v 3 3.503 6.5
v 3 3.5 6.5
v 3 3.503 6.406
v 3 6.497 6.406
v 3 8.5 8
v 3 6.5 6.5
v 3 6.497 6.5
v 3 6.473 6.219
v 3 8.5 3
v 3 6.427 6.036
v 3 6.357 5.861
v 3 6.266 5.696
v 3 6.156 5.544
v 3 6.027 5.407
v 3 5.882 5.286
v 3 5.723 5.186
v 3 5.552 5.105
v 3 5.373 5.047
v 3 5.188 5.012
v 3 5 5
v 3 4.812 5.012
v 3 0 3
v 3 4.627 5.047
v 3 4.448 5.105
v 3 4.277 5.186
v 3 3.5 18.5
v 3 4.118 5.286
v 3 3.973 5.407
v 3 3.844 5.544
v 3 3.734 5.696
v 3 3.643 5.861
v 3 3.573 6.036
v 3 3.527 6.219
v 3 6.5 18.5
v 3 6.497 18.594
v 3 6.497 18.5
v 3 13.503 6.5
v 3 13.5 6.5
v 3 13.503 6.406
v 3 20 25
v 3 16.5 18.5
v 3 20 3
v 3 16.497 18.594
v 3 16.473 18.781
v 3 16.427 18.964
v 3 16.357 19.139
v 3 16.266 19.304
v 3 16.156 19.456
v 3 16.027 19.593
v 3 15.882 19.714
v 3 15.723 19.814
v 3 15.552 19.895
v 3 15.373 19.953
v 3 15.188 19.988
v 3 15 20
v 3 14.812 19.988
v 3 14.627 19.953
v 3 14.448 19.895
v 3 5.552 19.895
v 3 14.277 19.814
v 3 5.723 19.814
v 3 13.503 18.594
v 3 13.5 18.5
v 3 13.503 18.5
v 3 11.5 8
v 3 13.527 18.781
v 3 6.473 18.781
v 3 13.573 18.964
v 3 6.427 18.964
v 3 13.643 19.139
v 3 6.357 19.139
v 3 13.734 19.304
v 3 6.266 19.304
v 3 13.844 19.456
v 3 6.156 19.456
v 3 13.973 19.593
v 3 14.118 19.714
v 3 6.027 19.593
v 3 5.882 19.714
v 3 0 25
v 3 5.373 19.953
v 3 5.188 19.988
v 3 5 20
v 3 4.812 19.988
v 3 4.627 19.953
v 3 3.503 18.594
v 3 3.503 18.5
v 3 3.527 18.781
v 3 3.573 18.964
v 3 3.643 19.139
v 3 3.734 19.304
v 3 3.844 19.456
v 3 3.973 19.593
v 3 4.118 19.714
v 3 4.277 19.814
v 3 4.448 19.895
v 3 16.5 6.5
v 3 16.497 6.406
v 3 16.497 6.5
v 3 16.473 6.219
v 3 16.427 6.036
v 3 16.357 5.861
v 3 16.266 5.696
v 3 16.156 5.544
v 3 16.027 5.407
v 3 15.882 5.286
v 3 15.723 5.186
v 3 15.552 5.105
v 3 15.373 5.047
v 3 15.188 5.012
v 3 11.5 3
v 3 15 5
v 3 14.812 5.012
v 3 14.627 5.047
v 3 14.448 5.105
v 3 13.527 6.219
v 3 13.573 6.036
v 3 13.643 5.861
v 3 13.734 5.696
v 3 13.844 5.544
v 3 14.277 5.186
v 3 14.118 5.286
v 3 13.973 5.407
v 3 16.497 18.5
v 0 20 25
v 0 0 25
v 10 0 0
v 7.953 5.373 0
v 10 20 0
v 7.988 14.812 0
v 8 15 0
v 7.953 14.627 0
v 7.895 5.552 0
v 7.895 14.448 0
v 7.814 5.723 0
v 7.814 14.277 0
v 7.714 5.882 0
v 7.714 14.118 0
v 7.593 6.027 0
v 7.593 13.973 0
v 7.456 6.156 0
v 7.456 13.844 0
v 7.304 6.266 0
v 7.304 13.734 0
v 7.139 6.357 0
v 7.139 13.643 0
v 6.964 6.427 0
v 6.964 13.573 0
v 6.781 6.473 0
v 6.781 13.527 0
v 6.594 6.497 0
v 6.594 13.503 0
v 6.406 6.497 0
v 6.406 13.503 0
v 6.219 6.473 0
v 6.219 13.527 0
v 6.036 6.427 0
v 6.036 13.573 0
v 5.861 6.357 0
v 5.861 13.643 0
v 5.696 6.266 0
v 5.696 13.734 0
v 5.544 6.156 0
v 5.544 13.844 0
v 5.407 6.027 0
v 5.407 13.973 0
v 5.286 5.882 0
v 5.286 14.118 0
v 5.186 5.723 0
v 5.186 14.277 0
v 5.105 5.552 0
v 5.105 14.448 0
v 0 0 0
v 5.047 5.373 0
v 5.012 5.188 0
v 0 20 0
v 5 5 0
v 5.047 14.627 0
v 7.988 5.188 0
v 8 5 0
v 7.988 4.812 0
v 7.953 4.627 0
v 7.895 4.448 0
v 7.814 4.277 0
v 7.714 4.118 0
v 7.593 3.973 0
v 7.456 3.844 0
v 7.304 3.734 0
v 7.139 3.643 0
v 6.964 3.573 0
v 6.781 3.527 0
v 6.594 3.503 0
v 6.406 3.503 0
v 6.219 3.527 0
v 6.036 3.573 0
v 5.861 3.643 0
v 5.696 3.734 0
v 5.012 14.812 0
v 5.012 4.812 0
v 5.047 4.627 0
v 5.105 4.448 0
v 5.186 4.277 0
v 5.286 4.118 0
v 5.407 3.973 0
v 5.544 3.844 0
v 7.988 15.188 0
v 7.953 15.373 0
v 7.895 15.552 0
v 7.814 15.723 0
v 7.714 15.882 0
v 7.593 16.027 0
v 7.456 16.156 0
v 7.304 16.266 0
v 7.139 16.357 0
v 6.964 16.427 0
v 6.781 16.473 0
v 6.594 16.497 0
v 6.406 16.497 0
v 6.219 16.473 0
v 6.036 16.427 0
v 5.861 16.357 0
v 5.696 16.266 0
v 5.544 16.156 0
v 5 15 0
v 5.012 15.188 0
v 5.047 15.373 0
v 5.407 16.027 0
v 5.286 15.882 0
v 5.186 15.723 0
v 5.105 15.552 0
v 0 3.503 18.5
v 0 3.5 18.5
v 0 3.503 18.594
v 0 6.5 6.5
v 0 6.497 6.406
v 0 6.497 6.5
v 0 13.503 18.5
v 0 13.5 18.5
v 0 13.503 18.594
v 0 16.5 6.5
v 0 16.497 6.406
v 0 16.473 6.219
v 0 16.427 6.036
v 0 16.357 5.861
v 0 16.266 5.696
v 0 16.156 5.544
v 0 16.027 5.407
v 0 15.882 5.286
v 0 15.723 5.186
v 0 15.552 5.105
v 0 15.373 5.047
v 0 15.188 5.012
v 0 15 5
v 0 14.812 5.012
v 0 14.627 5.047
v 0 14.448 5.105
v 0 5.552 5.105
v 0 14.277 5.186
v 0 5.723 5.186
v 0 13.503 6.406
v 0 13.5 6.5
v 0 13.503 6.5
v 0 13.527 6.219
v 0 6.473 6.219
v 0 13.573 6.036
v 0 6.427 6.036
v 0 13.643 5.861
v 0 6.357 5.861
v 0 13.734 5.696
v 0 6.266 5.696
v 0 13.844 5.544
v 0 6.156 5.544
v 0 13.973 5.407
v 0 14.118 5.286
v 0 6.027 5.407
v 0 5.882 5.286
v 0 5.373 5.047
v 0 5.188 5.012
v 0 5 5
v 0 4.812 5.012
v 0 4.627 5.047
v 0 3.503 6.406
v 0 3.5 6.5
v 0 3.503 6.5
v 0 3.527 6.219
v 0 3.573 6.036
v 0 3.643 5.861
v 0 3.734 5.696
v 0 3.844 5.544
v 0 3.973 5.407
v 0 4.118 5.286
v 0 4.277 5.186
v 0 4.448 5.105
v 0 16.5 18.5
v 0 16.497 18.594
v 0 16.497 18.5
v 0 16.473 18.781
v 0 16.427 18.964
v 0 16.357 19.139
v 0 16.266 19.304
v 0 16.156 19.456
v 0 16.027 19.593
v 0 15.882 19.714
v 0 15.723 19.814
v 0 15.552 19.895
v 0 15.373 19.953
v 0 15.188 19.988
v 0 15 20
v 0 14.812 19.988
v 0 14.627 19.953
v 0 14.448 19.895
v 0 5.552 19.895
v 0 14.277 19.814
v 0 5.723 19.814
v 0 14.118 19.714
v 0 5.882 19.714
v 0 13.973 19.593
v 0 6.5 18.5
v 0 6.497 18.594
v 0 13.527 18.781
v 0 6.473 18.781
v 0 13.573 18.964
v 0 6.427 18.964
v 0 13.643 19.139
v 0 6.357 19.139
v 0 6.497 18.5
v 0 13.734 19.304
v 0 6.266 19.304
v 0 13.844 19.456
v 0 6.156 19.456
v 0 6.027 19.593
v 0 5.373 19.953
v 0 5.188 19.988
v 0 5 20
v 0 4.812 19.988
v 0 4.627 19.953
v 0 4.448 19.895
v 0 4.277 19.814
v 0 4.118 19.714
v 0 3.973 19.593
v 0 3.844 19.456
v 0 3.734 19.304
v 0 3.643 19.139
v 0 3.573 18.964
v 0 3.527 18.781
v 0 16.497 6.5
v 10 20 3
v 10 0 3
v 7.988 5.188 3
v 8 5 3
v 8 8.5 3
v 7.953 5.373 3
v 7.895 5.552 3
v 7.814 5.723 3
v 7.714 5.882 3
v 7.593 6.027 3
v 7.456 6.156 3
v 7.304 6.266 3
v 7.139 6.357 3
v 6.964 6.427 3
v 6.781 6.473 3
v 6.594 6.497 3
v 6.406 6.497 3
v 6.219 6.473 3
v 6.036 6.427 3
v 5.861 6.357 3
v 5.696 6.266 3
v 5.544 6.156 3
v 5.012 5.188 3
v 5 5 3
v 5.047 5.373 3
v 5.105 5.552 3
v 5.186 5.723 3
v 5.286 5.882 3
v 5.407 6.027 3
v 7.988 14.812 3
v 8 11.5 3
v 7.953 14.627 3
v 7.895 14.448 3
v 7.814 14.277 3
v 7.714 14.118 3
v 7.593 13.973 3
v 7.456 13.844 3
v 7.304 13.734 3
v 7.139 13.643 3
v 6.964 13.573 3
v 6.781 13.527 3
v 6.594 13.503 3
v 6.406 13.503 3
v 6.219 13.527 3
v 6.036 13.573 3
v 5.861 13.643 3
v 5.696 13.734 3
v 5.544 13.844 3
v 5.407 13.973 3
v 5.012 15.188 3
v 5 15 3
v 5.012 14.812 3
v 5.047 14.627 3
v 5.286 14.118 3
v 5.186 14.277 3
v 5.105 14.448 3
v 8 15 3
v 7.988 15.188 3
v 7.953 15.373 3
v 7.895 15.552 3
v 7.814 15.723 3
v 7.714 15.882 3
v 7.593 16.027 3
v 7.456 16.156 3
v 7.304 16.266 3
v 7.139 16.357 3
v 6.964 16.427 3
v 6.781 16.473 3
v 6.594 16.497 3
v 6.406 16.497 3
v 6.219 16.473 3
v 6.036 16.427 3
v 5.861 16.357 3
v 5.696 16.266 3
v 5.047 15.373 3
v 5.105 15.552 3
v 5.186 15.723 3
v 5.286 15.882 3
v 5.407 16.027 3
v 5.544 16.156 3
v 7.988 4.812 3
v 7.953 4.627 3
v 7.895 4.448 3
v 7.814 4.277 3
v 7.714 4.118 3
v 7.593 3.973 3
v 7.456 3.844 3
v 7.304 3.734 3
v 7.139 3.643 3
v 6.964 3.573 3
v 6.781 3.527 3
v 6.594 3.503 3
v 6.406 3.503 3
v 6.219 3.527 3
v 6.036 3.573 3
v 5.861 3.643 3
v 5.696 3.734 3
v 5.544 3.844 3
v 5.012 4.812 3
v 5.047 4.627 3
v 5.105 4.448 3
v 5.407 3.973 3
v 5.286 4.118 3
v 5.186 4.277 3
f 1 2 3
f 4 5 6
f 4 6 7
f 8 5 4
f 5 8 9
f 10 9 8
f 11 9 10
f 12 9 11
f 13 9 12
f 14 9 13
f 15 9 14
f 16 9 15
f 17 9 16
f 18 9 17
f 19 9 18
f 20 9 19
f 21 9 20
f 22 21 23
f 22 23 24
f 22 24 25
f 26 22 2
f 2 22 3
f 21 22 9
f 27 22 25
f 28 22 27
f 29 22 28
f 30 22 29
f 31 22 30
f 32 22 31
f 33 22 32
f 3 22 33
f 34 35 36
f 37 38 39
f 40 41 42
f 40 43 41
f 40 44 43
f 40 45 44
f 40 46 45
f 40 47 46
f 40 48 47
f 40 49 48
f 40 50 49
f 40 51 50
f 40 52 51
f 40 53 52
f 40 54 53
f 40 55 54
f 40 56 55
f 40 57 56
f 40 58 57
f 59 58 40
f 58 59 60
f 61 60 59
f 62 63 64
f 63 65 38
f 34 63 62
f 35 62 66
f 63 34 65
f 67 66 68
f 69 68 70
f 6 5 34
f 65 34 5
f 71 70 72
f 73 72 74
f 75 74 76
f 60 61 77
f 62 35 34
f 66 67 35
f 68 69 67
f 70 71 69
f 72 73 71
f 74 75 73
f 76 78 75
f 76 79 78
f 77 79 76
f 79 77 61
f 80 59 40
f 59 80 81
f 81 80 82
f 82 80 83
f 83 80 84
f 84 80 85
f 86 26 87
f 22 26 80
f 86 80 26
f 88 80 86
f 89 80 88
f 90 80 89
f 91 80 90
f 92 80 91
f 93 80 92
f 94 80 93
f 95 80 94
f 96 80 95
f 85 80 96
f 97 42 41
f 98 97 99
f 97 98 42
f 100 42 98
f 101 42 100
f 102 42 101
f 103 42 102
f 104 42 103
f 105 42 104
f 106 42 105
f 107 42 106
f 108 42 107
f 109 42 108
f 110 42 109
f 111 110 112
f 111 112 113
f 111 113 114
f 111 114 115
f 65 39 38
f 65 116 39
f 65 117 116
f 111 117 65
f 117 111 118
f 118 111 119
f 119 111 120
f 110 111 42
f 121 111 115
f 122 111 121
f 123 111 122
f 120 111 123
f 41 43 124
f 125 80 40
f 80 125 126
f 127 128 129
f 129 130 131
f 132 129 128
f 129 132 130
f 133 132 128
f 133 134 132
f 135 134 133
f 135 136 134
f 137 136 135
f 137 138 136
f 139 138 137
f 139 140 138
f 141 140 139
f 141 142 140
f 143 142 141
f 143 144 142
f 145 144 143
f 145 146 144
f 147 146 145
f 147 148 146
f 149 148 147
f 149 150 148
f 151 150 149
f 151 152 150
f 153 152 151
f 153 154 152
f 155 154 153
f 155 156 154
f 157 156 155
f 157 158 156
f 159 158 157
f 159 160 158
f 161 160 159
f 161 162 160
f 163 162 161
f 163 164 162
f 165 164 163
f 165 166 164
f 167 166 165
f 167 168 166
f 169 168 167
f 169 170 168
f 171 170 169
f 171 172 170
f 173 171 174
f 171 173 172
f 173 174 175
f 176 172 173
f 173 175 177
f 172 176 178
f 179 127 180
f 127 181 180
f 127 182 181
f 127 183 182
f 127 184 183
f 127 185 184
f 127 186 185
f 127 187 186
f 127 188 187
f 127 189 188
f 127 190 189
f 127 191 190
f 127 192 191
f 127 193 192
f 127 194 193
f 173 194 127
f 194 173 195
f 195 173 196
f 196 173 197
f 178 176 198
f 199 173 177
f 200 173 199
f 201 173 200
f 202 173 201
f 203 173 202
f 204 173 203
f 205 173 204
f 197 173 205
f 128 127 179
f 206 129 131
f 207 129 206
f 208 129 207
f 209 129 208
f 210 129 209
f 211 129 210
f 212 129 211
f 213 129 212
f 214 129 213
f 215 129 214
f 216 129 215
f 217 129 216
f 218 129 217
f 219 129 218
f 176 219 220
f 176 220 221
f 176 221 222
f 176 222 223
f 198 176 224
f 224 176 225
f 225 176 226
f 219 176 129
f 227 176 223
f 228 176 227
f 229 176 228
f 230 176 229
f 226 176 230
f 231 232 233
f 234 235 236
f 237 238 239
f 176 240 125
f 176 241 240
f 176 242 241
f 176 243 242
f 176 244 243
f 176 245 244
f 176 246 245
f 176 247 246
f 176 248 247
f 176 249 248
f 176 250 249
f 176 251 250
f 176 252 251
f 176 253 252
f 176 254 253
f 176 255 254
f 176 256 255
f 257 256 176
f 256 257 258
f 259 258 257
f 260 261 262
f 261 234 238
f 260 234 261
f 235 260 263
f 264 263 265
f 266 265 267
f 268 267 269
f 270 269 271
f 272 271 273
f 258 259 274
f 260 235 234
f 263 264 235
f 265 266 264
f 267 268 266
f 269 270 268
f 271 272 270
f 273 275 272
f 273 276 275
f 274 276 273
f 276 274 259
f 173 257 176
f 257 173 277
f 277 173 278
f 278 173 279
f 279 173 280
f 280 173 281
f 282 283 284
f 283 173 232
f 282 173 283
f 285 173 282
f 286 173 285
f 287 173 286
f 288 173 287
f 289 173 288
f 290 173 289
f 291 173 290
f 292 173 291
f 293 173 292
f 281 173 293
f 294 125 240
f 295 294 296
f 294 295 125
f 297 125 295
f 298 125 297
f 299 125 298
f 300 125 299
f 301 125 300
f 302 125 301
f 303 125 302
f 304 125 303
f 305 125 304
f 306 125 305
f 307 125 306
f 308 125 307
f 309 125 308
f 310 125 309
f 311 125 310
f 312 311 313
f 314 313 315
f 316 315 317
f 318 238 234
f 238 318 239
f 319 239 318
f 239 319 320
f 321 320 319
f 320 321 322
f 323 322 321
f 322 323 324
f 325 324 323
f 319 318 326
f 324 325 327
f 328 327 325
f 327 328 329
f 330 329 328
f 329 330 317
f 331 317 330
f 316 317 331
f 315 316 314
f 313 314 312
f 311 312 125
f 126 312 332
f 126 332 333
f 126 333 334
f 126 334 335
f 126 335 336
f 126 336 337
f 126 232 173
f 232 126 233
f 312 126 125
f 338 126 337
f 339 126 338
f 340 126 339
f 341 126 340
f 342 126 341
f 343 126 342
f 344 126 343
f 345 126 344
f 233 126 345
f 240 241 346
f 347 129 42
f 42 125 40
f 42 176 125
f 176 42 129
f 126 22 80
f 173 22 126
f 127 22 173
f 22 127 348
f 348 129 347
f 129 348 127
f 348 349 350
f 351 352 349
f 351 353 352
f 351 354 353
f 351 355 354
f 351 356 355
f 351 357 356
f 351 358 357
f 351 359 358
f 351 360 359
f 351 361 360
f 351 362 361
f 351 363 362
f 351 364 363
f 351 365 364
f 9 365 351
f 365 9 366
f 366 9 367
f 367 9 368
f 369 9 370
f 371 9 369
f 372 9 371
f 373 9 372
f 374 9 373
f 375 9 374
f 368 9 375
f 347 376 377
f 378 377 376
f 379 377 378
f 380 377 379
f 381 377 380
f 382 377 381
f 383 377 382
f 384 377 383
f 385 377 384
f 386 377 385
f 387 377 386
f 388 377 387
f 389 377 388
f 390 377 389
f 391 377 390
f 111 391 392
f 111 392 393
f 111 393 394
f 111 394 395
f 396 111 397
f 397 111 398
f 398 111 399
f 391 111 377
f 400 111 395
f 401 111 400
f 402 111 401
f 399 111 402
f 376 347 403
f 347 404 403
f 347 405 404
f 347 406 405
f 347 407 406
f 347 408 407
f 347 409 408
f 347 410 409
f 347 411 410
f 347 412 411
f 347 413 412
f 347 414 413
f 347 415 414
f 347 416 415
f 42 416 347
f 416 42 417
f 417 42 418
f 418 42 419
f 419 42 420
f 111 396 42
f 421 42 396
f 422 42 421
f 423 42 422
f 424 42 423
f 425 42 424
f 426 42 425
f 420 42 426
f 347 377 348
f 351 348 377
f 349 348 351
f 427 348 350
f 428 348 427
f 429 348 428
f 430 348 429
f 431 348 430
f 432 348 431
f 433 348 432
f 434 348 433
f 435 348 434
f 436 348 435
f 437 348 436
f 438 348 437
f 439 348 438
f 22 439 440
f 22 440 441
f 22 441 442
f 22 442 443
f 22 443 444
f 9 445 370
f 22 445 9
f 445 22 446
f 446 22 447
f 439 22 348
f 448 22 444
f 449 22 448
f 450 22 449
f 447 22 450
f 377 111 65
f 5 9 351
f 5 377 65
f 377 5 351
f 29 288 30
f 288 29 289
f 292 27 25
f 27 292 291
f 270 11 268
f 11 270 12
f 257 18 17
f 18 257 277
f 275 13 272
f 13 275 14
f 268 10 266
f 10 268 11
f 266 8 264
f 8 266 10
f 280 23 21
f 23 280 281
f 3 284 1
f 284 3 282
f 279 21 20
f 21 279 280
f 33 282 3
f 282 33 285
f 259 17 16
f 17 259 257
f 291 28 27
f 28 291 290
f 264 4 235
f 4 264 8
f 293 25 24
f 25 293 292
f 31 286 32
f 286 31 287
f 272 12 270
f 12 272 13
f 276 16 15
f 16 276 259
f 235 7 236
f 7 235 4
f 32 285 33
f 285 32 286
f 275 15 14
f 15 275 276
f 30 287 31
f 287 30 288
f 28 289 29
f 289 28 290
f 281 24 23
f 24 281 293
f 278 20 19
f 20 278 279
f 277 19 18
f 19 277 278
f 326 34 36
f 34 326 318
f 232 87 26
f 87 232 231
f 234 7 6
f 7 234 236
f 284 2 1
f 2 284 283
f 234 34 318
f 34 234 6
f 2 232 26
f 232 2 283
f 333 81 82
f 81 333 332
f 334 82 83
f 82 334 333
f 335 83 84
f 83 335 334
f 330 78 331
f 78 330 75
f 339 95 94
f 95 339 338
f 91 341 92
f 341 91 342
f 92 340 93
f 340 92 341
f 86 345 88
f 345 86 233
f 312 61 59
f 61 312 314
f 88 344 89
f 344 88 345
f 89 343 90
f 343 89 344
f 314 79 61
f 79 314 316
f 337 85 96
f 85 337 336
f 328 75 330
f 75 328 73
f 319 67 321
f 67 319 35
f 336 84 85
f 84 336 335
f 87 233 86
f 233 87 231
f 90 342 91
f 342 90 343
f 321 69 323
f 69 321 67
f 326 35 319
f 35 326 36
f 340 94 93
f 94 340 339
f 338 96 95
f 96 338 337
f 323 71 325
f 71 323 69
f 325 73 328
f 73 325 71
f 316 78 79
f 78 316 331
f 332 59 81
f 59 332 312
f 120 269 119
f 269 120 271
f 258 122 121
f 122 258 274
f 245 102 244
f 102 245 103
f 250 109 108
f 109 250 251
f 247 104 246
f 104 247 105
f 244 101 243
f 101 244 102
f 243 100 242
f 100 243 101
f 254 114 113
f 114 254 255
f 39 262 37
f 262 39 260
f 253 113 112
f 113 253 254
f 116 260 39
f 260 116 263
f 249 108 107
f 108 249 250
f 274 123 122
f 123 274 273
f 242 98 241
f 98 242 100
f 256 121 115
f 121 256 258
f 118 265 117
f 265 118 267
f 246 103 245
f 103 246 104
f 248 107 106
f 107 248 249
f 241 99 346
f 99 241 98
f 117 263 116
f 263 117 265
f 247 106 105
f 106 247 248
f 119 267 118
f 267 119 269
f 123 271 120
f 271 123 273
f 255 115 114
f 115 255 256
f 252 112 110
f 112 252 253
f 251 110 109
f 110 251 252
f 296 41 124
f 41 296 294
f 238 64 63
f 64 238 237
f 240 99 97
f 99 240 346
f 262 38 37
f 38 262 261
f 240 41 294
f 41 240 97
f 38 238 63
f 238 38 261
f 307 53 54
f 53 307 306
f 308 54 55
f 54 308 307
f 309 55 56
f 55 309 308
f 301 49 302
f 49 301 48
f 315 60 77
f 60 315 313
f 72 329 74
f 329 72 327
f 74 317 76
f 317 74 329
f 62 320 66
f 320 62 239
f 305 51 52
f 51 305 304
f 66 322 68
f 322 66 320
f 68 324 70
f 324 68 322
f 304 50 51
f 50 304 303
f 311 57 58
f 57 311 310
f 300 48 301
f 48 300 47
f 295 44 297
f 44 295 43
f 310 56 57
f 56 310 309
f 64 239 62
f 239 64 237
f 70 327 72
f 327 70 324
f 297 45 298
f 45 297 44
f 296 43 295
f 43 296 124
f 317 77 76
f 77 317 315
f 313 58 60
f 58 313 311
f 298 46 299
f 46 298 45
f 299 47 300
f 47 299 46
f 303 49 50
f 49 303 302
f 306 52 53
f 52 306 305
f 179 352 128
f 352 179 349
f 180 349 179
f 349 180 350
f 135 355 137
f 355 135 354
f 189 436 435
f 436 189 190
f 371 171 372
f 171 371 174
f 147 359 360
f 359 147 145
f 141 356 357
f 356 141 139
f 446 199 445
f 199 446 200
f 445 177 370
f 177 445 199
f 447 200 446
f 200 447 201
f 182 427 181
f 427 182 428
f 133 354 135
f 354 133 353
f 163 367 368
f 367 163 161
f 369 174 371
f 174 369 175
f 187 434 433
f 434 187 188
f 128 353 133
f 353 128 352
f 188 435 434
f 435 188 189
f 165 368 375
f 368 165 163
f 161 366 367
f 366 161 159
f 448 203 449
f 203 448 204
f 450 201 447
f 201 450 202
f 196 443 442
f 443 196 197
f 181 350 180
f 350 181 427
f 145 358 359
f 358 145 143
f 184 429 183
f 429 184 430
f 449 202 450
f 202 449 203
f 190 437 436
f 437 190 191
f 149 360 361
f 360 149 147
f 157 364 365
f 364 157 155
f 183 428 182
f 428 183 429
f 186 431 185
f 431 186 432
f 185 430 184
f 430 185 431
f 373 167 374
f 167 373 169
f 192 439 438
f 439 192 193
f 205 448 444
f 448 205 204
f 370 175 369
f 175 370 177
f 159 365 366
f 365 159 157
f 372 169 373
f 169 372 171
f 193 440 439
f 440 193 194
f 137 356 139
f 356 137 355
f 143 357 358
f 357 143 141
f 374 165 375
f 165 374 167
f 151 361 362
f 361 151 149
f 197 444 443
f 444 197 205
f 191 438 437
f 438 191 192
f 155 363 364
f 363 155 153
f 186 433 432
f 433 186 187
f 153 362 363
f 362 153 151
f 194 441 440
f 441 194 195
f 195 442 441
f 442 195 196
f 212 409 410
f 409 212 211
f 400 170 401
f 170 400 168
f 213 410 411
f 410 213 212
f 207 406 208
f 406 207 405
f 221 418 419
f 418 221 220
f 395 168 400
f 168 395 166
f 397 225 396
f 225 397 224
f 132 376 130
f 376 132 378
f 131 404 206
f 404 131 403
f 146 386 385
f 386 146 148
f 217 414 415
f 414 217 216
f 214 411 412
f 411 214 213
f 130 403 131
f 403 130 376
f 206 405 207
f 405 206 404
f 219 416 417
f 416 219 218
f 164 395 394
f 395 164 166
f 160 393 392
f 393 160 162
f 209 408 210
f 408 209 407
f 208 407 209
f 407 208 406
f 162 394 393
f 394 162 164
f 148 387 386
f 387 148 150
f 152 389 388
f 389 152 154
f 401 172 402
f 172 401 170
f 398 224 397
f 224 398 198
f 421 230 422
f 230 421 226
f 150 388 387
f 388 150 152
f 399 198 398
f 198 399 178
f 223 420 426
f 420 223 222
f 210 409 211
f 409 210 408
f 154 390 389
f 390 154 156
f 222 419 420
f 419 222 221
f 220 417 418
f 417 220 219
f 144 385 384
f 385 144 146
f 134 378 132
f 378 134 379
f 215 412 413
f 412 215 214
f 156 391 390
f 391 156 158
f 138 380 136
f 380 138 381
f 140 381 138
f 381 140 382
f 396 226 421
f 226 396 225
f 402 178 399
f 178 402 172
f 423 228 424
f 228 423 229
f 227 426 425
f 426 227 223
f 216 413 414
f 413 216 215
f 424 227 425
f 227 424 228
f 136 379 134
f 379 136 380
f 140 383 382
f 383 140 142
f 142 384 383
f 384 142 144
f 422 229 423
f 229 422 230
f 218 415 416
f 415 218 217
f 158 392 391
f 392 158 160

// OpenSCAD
$fn=50;

largeur=20;
larg_base=10;
hauteur=25;
dist_trous=10;
dia_trous=3;
long_trous=15;
epaisseur=3;

module renfort()
{
    translate([0,epaisseur/2,0])
        rotate([90,0,0])
            linear_extrude(epaisseur)
                polygon([[0,0],[5,0],[0,5]]);
}

module trou()
{
    translate([0,0,-0.1])
        cylinder(d=dia_trous,h=epaisseur+0.2);
}

module trou_oblong(dia,long,ep)
{
    translate([dia/2,0,-0.1])
    union()
    {
        cylinder(d=dia,h=ep+0.2);
        translate([0,-dia/2,0])
            cube([long-dia,dia,ep+0.2]);
        translate([long-dia,0,0])
            cylinder(d=dia,h=ep+0.2);
    }
}

module base_support()
{
    cube([epaisseur,largeur,hauteur]);
    cube([larg_base,largeur,epaisseur]);
    translate([epaisseur,largeur/2,epaisseur])
        renfort();
}

module support_complet()
{
    difference()
    {
        base_support();
        //trou oblong 1
        translate([0,largeur/4,(hauteur-long_trous)/2])
            rotate([0,-90,0])
                translate([0,0,-epaisseur])
                    trou_oblong(dia_trous,long_trous,epaisseur);
        //trou oblong 2
        translate([0,3*largeur/4,(hauteur-long_trous)/2])
            rotate([0,-90,0])
                translate([0,0,-epaisseur])
                    trou_oblong(dia_trous,long_trous,epaisseur);
        //trou base 1
        translate([larg_base/2+epaisseur/2,largeur/4,0])
            trou();
        //trou base 2
        translate([larg_base/2+epaisseur/2,3*largeur/4,0])
            trou();  
            
    }
}

support_complet();
